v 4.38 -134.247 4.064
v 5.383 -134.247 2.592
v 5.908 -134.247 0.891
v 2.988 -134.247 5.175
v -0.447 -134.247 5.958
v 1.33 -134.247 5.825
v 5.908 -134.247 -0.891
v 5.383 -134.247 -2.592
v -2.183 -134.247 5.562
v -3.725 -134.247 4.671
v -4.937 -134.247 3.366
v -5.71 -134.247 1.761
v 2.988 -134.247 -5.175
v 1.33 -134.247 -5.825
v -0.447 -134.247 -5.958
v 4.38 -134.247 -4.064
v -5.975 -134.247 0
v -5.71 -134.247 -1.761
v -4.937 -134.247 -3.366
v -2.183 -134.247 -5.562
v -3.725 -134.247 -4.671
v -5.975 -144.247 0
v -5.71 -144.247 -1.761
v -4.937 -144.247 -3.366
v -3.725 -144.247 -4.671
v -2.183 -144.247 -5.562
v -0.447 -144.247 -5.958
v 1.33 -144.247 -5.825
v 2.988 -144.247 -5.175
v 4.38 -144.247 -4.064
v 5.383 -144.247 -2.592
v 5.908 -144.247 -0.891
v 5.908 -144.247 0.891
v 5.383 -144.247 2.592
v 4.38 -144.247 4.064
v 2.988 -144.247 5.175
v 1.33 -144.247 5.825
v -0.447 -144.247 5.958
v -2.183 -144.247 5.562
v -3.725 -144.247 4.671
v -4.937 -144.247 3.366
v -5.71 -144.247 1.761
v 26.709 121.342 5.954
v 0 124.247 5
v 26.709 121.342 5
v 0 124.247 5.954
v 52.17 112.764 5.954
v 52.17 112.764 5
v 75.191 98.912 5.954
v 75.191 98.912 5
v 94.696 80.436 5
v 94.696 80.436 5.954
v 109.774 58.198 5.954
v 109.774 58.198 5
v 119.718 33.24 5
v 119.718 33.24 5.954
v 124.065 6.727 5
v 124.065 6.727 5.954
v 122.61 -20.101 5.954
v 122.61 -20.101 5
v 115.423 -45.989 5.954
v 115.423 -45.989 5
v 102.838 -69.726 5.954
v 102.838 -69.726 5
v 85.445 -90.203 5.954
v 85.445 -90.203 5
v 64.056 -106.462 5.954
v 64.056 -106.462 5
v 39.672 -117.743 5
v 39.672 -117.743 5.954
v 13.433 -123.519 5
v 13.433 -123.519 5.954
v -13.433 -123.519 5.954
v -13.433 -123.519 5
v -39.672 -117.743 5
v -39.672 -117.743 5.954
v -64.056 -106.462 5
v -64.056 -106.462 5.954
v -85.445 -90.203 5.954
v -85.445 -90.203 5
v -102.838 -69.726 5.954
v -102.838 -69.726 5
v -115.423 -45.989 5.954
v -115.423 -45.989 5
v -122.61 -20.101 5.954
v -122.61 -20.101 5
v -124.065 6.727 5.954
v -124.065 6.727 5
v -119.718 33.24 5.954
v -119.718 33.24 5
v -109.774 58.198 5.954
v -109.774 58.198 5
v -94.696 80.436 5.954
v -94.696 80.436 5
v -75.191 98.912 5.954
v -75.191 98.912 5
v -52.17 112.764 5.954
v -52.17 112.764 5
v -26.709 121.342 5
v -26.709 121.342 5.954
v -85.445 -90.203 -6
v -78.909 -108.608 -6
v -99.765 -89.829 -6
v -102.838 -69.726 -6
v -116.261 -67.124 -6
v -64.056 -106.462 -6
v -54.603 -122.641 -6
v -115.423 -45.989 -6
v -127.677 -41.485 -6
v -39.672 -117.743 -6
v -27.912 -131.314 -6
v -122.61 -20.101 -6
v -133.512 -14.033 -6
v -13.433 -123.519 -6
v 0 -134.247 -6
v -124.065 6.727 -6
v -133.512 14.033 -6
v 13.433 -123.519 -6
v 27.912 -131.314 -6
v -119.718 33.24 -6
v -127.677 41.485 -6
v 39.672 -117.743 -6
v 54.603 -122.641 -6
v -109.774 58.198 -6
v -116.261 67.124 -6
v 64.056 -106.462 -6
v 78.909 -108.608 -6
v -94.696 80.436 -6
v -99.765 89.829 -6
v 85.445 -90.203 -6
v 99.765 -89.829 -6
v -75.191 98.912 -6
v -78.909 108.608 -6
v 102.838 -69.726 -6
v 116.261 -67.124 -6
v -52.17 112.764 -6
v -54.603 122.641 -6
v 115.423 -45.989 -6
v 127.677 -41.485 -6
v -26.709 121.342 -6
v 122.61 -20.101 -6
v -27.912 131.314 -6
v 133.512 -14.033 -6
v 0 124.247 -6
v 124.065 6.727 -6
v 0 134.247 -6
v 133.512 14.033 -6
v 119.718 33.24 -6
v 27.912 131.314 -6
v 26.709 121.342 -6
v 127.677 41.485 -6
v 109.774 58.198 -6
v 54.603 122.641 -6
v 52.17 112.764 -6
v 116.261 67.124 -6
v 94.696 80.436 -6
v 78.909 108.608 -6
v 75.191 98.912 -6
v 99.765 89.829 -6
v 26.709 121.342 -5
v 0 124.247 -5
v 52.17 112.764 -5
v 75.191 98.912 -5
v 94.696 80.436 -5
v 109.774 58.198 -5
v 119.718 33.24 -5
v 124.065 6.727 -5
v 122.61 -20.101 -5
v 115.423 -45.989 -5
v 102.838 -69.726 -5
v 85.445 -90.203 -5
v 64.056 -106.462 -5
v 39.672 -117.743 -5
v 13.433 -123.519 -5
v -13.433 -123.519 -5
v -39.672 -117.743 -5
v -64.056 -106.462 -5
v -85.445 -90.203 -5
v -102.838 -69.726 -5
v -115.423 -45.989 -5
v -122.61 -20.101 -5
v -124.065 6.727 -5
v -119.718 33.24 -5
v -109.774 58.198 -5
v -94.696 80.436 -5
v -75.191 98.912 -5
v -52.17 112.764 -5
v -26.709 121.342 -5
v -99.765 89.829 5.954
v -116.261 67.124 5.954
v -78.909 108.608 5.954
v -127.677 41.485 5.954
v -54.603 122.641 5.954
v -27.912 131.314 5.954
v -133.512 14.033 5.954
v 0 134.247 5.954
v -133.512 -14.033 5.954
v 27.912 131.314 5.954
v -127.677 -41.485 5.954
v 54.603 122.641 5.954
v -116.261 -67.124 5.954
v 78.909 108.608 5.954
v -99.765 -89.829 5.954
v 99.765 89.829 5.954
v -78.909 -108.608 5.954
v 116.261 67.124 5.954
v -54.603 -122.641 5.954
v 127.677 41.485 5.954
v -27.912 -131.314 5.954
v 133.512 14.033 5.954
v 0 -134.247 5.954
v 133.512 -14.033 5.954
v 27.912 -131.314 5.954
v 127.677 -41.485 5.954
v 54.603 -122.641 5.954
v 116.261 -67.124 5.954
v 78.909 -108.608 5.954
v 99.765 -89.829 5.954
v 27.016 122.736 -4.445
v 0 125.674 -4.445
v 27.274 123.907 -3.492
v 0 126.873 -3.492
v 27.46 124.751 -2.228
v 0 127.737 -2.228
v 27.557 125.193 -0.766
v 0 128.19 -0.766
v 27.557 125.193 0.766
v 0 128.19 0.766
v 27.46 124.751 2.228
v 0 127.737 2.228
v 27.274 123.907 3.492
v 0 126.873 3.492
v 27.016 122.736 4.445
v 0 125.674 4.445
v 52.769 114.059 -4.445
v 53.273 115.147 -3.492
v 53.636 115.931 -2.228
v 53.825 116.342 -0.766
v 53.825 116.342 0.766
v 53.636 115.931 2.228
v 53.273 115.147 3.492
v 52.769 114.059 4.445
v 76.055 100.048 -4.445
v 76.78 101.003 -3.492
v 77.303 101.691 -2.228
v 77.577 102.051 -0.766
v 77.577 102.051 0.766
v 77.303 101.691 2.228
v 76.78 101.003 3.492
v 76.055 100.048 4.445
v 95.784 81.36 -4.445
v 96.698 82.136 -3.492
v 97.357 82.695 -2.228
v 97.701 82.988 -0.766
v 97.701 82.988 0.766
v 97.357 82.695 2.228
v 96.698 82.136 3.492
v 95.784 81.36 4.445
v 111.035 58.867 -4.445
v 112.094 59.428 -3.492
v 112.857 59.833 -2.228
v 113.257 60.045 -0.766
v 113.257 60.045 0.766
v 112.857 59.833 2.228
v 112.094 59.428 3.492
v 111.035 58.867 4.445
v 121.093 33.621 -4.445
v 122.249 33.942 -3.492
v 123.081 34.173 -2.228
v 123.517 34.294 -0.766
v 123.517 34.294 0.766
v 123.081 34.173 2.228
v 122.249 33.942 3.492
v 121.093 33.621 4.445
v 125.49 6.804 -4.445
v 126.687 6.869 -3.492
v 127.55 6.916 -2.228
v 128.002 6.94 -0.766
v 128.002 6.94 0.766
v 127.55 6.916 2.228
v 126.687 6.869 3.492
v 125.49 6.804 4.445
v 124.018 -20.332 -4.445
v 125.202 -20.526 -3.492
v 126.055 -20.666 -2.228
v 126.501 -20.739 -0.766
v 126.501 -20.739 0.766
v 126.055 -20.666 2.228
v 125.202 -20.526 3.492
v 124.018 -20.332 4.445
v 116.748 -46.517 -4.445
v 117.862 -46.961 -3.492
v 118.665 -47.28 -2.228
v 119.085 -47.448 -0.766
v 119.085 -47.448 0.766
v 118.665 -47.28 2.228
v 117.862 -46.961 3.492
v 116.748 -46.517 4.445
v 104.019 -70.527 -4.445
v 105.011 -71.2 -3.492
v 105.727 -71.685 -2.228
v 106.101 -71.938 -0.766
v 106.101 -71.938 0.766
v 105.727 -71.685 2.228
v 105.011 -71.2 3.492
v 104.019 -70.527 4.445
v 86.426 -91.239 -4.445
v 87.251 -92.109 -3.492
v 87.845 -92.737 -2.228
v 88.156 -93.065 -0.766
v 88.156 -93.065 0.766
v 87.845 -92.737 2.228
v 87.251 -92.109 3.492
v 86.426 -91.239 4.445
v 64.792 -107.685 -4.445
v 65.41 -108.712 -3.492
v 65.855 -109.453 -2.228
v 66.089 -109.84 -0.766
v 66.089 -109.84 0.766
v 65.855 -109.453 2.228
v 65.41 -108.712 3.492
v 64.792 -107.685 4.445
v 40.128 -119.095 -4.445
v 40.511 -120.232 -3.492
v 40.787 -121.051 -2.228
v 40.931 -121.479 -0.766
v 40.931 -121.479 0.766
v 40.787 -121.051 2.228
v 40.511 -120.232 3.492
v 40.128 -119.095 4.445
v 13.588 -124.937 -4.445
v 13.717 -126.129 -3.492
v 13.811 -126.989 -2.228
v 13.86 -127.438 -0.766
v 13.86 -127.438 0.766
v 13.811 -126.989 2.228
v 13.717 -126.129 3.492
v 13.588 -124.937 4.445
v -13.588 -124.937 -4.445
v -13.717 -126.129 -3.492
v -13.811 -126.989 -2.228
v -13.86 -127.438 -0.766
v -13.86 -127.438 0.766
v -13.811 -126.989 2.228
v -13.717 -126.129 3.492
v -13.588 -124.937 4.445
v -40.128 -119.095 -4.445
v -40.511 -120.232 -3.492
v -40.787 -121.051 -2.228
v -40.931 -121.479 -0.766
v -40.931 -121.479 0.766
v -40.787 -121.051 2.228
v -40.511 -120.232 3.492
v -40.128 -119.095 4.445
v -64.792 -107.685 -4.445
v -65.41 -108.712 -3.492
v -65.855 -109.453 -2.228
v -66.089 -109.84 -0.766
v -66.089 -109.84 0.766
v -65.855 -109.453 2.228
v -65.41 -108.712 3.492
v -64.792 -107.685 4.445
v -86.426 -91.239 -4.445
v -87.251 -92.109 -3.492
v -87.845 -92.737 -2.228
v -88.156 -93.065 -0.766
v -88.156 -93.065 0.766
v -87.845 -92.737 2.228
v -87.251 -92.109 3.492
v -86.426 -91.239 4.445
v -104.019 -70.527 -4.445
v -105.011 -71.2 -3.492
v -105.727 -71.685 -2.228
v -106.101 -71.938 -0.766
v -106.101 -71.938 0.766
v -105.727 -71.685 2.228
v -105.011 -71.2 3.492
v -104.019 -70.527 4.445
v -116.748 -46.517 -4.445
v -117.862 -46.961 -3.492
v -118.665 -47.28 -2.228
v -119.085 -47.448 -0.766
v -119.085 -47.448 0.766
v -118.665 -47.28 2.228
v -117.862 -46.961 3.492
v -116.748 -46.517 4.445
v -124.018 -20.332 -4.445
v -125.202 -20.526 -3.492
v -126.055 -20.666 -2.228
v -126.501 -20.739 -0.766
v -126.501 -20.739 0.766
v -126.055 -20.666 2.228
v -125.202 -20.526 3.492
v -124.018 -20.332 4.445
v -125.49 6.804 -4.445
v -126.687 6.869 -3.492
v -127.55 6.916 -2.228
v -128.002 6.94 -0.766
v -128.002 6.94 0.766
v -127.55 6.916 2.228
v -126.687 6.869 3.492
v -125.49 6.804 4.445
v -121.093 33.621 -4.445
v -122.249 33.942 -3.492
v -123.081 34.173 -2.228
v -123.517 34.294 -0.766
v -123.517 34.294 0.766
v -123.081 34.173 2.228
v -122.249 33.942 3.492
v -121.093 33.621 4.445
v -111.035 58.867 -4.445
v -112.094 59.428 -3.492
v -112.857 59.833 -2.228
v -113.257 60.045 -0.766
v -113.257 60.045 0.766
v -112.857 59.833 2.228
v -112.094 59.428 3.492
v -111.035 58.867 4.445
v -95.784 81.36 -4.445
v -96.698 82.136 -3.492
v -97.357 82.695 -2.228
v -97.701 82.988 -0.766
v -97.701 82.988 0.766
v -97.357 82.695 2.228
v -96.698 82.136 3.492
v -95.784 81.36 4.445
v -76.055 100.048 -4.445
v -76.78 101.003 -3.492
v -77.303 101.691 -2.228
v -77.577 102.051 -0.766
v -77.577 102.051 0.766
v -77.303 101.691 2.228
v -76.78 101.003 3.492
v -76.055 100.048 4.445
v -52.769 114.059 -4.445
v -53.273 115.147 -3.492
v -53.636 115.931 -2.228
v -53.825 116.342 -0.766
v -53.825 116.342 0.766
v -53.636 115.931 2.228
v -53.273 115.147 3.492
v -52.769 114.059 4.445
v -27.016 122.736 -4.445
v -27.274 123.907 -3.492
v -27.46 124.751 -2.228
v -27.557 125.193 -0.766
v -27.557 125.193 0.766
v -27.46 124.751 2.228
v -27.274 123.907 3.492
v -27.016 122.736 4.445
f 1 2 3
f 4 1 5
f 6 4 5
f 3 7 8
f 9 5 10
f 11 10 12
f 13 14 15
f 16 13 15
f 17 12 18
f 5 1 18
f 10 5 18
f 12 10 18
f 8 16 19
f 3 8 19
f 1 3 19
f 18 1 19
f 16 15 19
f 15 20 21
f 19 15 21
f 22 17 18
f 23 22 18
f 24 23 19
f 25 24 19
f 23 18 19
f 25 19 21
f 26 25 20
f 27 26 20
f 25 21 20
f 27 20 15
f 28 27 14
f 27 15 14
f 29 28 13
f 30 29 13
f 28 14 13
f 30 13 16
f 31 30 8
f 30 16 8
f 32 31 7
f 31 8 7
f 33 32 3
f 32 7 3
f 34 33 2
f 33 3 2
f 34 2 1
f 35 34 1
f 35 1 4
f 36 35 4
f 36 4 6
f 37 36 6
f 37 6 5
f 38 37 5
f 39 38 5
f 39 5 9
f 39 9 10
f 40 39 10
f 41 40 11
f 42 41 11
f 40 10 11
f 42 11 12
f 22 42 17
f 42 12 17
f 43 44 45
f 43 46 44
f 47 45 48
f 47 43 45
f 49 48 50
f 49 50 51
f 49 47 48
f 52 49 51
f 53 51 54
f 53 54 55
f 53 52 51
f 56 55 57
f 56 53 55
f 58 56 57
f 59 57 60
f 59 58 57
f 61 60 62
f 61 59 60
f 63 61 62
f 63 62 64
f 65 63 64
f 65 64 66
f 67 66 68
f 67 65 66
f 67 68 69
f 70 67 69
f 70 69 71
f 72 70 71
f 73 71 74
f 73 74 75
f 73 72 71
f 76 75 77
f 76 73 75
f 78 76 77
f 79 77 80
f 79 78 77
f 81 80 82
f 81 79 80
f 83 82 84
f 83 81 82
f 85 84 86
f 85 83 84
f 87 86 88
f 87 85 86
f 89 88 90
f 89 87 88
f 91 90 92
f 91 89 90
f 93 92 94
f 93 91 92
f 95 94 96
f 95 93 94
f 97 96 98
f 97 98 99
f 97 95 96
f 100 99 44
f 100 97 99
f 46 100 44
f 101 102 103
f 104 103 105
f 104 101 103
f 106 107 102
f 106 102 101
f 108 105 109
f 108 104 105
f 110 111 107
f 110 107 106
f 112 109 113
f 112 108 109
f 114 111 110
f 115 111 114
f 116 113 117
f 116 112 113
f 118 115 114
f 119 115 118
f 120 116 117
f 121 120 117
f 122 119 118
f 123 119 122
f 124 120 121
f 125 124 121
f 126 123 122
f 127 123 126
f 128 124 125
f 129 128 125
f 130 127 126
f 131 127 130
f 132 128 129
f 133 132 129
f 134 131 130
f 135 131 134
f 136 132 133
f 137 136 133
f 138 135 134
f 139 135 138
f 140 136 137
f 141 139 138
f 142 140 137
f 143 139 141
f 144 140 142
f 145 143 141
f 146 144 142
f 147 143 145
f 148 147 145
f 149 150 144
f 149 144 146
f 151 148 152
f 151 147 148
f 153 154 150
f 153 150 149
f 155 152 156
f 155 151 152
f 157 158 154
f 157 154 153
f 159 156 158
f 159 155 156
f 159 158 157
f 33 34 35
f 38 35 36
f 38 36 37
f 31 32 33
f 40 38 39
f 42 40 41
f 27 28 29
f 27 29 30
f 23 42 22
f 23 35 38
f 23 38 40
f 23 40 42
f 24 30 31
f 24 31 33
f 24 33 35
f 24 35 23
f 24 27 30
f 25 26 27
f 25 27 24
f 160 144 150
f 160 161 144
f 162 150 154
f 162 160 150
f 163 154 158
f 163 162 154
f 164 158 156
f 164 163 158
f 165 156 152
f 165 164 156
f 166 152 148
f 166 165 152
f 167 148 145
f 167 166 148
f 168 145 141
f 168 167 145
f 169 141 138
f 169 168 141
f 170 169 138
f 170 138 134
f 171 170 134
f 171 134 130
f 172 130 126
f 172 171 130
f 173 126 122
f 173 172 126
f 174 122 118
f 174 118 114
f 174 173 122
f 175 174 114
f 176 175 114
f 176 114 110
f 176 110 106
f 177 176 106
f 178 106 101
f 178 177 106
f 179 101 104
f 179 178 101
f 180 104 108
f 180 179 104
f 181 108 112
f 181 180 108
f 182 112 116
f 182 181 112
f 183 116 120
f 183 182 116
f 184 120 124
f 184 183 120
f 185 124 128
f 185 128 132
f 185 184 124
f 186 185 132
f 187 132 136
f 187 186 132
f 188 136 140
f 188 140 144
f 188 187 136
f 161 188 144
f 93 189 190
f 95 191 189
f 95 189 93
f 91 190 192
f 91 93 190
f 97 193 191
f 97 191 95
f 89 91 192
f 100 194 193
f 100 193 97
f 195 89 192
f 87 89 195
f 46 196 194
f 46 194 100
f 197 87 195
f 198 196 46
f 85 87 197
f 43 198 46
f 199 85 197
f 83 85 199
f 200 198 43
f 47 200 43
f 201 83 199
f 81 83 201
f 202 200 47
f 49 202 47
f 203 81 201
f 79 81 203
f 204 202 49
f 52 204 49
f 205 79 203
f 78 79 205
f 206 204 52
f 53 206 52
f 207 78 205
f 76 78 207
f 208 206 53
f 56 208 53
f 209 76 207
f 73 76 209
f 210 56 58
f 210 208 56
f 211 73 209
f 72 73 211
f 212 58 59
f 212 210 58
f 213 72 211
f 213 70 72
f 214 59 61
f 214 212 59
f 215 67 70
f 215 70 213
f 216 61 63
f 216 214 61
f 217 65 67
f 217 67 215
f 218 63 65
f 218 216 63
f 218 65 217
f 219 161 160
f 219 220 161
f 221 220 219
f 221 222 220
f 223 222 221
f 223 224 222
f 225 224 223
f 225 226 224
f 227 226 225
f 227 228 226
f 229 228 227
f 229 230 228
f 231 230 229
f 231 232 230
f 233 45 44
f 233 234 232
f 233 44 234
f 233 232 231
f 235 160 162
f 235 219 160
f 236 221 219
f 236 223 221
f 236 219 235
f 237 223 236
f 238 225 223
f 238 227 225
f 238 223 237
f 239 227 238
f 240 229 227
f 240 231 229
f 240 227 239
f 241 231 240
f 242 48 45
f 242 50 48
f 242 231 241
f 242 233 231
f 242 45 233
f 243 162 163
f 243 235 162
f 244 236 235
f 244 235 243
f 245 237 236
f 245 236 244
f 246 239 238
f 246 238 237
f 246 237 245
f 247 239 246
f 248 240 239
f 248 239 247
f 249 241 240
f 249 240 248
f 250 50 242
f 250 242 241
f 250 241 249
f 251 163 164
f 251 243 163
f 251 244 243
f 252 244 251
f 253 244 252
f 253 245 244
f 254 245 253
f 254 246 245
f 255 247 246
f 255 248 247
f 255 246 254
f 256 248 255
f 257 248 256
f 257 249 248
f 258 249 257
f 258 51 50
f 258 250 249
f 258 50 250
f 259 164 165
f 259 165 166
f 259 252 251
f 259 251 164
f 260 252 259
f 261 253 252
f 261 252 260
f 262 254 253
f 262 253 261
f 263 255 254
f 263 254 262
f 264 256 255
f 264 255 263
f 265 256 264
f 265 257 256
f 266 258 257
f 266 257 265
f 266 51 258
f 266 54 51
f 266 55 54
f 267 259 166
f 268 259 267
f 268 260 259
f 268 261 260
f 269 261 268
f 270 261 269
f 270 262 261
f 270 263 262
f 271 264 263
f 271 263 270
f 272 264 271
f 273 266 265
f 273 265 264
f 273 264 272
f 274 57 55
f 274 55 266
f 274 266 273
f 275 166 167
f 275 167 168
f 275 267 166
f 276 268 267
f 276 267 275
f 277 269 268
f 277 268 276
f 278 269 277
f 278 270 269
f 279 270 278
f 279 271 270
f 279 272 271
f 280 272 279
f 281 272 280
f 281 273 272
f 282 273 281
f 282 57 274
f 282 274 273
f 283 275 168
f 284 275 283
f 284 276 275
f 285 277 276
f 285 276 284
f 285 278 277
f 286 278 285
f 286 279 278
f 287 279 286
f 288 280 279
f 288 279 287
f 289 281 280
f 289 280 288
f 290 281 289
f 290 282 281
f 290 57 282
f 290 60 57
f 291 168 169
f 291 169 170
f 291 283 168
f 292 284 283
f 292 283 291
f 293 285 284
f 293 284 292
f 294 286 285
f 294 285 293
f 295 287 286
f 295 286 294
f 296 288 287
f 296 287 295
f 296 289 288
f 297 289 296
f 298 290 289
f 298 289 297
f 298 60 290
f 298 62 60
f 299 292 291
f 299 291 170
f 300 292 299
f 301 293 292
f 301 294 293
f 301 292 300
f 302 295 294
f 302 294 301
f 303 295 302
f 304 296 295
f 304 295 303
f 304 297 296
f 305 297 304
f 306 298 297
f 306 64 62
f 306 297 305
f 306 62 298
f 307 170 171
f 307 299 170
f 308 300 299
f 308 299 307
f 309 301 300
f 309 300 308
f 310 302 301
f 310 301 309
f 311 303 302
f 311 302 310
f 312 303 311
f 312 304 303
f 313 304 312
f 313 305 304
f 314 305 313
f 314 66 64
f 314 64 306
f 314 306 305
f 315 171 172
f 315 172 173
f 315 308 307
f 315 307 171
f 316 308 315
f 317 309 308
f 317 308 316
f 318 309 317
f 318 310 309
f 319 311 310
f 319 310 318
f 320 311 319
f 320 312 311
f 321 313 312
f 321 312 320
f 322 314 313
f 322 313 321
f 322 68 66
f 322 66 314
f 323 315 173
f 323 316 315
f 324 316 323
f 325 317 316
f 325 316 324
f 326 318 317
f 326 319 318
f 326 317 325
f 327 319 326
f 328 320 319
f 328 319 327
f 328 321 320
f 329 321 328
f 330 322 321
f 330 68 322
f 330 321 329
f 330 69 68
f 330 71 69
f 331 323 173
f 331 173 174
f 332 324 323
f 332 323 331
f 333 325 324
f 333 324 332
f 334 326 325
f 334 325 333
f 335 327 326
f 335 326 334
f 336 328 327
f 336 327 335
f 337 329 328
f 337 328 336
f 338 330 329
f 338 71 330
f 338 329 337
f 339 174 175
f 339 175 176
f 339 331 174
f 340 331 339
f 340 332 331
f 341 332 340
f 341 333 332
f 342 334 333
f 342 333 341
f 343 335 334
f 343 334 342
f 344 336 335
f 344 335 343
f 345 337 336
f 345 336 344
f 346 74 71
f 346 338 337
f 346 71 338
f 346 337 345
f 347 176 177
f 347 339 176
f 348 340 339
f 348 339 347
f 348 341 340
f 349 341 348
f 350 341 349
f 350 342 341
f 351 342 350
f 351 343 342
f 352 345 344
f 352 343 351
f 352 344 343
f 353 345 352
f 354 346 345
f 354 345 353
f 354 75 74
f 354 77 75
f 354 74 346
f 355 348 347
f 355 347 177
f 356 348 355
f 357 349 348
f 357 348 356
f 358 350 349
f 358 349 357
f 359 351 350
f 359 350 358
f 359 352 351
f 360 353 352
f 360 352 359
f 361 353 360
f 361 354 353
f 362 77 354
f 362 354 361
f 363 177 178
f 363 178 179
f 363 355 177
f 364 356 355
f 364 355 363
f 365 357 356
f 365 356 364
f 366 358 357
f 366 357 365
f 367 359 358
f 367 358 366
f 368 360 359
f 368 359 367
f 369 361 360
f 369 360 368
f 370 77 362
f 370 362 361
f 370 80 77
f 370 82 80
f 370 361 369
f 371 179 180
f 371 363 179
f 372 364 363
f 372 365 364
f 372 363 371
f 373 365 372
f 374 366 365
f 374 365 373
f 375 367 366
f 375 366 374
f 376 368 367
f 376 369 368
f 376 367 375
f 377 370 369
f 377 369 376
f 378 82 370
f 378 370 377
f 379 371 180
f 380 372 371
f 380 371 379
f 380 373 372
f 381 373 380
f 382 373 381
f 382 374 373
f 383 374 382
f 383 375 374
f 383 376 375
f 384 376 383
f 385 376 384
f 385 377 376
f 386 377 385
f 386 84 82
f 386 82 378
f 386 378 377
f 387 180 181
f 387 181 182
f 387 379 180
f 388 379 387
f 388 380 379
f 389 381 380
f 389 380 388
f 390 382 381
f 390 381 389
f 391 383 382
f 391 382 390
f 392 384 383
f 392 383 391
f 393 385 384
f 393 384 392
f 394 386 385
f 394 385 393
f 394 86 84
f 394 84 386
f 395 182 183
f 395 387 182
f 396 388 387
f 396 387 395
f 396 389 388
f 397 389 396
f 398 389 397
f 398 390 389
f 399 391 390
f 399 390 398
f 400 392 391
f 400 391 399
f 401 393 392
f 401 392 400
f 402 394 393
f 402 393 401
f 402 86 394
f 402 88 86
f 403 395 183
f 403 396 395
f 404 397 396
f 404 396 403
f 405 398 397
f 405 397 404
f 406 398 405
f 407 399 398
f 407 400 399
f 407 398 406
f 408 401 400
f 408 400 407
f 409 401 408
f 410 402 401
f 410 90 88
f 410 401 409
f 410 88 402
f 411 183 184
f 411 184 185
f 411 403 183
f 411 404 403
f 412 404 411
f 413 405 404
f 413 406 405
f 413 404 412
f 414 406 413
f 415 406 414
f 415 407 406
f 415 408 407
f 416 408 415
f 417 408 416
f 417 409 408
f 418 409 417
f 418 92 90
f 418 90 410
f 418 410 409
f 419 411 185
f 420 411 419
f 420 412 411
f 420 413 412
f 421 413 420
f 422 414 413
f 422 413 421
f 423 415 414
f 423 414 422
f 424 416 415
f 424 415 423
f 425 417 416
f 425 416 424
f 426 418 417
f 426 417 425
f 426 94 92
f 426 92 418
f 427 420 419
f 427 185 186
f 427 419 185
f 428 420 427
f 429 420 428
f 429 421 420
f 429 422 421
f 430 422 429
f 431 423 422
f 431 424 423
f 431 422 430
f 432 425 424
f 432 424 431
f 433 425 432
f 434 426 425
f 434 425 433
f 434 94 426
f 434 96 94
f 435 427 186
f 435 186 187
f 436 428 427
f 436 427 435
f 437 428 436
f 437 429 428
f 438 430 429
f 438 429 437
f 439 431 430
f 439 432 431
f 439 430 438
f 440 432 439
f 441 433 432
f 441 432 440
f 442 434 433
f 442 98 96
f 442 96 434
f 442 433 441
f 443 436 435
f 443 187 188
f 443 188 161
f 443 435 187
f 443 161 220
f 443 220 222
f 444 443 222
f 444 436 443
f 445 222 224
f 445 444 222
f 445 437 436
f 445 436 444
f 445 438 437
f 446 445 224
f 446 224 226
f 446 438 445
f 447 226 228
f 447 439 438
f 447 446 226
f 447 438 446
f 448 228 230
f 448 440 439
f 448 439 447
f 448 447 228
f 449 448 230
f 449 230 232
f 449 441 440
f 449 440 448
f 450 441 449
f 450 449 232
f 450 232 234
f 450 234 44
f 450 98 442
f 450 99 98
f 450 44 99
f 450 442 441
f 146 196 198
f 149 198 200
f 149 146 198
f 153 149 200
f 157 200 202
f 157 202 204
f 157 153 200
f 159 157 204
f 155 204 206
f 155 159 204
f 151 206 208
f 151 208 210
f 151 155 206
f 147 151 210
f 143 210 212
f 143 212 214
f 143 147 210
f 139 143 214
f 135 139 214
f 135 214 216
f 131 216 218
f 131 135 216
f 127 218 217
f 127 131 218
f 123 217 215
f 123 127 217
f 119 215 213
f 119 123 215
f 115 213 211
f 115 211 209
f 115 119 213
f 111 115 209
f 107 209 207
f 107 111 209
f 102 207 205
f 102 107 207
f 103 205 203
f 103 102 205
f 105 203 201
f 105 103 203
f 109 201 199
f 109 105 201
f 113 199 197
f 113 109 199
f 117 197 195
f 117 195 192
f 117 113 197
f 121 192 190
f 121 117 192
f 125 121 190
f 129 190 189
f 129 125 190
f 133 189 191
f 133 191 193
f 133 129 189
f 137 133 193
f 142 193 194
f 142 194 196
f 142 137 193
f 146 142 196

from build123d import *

# Parameters (mm, degrees)
SKETCH3_R           = 5.975
BOSS_EXTRUDE1_DEPTH = 10


with BuildPart() as part:
    # Sketch1 → Revolve1 (revolve)
    with BuildSketch(Plane(origin=(0, 0, 0), x_dir=(0, 0, -1), z_dir=(1, 0, 0))):
        with BuildLine():
            Line((-5.954399753, 124.24716621), (-5.954399753, 134.24716621))
            Line((-5.954399753, 134.24716621), (6, 134.24716621))
            Line((6, 134.24716621), (6, 124.24716621))
            Line((6, 124.24716621), (5, 124.24716621))
            ThreePointArc((5, 124.24716621), (0, 128.24716621), (-5, 124.24716621))
            Line((-5, 124.24716621), (-5.954399753, 124.24716621))
        make_face()
    revolve(axis=Axis((0, 0, 30.30234015), (0, 0, -1)))


with BuildPart() as body_2:
    # Sketch3 → Boss-Extrude1 (new body)
    with BuildSketch(Plane(origin=(0, -134.24716621, 0), x_dir=(-1, 0, 0), z_dir=(0, -1, 0))):
        Circle(SKETCH3_R)
    extrude(amount=BOSS_EXTRUDE1_DEPTH)


solid = Compound([part.part, body_2.part])
